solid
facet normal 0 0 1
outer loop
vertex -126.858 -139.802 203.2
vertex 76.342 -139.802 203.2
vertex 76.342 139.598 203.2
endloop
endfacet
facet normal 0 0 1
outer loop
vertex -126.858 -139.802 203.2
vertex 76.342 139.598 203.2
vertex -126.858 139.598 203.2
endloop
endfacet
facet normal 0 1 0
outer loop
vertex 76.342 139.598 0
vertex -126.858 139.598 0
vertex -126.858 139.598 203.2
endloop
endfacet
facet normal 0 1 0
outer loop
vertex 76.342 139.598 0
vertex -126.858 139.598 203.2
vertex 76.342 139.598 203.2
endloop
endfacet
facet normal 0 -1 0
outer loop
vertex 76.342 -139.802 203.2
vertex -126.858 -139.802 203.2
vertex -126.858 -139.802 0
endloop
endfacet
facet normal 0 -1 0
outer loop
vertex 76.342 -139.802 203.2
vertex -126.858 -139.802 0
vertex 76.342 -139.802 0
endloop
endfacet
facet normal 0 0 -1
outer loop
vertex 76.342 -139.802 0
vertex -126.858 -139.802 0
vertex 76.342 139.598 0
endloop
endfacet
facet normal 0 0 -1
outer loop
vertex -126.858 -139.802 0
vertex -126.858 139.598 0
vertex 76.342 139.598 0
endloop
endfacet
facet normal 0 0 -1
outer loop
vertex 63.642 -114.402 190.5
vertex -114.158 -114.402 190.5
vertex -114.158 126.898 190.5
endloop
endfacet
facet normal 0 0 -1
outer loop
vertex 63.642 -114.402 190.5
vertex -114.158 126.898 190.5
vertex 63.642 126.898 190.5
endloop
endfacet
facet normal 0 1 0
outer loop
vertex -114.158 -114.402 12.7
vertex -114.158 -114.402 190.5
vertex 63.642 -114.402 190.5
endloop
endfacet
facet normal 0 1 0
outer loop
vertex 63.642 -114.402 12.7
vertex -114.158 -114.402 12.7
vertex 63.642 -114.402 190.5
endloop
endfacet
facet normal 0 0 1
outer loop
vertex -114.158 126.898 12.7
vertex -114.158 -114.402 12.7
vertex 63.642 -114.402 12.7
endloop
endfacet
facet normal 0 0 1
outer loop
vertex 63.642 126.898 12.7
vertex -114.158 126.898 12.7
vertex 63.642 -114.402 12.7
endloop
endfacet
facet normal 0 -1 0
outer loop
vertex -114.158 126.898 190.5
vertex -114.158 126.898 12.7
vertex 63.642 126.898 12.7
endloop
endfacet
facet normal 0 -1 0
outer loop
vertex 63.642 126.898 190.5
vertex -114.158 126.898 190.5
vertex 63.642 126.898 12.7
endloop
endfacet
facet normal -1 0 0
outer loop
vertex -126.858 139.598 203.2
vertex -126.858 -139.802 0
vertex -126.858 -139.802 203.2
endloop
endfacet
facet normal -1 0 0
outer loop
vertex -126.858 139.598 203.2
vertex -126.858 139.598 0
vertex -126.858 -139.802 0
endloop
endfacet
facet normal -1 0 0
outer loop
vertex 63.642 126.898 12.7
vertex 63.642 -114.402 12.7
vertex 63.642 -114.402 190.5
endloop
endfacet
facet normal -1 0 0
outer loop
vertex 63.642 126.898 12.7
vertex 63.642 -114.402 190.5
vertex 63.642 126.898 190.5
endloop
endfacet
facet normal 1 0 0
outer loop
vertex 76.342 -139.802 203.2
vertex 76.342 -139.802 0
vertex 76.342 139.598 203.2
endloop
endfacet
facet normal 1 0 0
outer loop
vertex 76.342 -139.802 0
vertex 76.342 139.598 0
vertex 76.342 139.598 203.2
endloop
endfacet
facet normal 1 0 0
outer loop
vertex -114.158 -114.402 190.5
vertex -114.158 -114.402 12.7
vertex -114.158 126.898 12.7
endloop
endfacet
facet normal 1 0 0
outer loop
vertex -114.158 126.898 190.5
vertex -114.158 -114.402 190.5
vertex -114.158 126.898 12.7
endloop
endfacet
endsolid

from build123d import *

# Parameters (mm, degrees)
F0_W     = 203.2
F0_H     = 254
F1_DEPTH = 203.2
F2_T     = -12.7
F3_W     = 101.6
F3_H     = 203.2
F4_DEPTH = 25.4


with BuildPart() as f1:
    # F0 (on Top) → F1 (new body)
    with BuildSketch(Plane.XY):
        with Locations((-25.257506, 12.597671)):
            Rectangle(F0_W, F0_H)
    extrude(amount=F1_DEPTH)

    # F2
    f2_openings = [f1.faces().sort_by_distance(p)[0] for p in [
        (-25.257506, -114.402329, 101.6),
    ]]
    offset(amount=F2_T, openings=f2_openings)

    # F3 (on face) → F4 (join)
    with BuildSketch(Plane.XZ.offset(114.402329)):
        with Locations((-76.057506, 101.6)):
            Rectangle(F3_W, F3_H)
        with Locations((25.542494, 101.6)):
            Rectangle(F3_W, F3_H)
    extrude(amount=F4_DEPTH)


solid = f1.part
